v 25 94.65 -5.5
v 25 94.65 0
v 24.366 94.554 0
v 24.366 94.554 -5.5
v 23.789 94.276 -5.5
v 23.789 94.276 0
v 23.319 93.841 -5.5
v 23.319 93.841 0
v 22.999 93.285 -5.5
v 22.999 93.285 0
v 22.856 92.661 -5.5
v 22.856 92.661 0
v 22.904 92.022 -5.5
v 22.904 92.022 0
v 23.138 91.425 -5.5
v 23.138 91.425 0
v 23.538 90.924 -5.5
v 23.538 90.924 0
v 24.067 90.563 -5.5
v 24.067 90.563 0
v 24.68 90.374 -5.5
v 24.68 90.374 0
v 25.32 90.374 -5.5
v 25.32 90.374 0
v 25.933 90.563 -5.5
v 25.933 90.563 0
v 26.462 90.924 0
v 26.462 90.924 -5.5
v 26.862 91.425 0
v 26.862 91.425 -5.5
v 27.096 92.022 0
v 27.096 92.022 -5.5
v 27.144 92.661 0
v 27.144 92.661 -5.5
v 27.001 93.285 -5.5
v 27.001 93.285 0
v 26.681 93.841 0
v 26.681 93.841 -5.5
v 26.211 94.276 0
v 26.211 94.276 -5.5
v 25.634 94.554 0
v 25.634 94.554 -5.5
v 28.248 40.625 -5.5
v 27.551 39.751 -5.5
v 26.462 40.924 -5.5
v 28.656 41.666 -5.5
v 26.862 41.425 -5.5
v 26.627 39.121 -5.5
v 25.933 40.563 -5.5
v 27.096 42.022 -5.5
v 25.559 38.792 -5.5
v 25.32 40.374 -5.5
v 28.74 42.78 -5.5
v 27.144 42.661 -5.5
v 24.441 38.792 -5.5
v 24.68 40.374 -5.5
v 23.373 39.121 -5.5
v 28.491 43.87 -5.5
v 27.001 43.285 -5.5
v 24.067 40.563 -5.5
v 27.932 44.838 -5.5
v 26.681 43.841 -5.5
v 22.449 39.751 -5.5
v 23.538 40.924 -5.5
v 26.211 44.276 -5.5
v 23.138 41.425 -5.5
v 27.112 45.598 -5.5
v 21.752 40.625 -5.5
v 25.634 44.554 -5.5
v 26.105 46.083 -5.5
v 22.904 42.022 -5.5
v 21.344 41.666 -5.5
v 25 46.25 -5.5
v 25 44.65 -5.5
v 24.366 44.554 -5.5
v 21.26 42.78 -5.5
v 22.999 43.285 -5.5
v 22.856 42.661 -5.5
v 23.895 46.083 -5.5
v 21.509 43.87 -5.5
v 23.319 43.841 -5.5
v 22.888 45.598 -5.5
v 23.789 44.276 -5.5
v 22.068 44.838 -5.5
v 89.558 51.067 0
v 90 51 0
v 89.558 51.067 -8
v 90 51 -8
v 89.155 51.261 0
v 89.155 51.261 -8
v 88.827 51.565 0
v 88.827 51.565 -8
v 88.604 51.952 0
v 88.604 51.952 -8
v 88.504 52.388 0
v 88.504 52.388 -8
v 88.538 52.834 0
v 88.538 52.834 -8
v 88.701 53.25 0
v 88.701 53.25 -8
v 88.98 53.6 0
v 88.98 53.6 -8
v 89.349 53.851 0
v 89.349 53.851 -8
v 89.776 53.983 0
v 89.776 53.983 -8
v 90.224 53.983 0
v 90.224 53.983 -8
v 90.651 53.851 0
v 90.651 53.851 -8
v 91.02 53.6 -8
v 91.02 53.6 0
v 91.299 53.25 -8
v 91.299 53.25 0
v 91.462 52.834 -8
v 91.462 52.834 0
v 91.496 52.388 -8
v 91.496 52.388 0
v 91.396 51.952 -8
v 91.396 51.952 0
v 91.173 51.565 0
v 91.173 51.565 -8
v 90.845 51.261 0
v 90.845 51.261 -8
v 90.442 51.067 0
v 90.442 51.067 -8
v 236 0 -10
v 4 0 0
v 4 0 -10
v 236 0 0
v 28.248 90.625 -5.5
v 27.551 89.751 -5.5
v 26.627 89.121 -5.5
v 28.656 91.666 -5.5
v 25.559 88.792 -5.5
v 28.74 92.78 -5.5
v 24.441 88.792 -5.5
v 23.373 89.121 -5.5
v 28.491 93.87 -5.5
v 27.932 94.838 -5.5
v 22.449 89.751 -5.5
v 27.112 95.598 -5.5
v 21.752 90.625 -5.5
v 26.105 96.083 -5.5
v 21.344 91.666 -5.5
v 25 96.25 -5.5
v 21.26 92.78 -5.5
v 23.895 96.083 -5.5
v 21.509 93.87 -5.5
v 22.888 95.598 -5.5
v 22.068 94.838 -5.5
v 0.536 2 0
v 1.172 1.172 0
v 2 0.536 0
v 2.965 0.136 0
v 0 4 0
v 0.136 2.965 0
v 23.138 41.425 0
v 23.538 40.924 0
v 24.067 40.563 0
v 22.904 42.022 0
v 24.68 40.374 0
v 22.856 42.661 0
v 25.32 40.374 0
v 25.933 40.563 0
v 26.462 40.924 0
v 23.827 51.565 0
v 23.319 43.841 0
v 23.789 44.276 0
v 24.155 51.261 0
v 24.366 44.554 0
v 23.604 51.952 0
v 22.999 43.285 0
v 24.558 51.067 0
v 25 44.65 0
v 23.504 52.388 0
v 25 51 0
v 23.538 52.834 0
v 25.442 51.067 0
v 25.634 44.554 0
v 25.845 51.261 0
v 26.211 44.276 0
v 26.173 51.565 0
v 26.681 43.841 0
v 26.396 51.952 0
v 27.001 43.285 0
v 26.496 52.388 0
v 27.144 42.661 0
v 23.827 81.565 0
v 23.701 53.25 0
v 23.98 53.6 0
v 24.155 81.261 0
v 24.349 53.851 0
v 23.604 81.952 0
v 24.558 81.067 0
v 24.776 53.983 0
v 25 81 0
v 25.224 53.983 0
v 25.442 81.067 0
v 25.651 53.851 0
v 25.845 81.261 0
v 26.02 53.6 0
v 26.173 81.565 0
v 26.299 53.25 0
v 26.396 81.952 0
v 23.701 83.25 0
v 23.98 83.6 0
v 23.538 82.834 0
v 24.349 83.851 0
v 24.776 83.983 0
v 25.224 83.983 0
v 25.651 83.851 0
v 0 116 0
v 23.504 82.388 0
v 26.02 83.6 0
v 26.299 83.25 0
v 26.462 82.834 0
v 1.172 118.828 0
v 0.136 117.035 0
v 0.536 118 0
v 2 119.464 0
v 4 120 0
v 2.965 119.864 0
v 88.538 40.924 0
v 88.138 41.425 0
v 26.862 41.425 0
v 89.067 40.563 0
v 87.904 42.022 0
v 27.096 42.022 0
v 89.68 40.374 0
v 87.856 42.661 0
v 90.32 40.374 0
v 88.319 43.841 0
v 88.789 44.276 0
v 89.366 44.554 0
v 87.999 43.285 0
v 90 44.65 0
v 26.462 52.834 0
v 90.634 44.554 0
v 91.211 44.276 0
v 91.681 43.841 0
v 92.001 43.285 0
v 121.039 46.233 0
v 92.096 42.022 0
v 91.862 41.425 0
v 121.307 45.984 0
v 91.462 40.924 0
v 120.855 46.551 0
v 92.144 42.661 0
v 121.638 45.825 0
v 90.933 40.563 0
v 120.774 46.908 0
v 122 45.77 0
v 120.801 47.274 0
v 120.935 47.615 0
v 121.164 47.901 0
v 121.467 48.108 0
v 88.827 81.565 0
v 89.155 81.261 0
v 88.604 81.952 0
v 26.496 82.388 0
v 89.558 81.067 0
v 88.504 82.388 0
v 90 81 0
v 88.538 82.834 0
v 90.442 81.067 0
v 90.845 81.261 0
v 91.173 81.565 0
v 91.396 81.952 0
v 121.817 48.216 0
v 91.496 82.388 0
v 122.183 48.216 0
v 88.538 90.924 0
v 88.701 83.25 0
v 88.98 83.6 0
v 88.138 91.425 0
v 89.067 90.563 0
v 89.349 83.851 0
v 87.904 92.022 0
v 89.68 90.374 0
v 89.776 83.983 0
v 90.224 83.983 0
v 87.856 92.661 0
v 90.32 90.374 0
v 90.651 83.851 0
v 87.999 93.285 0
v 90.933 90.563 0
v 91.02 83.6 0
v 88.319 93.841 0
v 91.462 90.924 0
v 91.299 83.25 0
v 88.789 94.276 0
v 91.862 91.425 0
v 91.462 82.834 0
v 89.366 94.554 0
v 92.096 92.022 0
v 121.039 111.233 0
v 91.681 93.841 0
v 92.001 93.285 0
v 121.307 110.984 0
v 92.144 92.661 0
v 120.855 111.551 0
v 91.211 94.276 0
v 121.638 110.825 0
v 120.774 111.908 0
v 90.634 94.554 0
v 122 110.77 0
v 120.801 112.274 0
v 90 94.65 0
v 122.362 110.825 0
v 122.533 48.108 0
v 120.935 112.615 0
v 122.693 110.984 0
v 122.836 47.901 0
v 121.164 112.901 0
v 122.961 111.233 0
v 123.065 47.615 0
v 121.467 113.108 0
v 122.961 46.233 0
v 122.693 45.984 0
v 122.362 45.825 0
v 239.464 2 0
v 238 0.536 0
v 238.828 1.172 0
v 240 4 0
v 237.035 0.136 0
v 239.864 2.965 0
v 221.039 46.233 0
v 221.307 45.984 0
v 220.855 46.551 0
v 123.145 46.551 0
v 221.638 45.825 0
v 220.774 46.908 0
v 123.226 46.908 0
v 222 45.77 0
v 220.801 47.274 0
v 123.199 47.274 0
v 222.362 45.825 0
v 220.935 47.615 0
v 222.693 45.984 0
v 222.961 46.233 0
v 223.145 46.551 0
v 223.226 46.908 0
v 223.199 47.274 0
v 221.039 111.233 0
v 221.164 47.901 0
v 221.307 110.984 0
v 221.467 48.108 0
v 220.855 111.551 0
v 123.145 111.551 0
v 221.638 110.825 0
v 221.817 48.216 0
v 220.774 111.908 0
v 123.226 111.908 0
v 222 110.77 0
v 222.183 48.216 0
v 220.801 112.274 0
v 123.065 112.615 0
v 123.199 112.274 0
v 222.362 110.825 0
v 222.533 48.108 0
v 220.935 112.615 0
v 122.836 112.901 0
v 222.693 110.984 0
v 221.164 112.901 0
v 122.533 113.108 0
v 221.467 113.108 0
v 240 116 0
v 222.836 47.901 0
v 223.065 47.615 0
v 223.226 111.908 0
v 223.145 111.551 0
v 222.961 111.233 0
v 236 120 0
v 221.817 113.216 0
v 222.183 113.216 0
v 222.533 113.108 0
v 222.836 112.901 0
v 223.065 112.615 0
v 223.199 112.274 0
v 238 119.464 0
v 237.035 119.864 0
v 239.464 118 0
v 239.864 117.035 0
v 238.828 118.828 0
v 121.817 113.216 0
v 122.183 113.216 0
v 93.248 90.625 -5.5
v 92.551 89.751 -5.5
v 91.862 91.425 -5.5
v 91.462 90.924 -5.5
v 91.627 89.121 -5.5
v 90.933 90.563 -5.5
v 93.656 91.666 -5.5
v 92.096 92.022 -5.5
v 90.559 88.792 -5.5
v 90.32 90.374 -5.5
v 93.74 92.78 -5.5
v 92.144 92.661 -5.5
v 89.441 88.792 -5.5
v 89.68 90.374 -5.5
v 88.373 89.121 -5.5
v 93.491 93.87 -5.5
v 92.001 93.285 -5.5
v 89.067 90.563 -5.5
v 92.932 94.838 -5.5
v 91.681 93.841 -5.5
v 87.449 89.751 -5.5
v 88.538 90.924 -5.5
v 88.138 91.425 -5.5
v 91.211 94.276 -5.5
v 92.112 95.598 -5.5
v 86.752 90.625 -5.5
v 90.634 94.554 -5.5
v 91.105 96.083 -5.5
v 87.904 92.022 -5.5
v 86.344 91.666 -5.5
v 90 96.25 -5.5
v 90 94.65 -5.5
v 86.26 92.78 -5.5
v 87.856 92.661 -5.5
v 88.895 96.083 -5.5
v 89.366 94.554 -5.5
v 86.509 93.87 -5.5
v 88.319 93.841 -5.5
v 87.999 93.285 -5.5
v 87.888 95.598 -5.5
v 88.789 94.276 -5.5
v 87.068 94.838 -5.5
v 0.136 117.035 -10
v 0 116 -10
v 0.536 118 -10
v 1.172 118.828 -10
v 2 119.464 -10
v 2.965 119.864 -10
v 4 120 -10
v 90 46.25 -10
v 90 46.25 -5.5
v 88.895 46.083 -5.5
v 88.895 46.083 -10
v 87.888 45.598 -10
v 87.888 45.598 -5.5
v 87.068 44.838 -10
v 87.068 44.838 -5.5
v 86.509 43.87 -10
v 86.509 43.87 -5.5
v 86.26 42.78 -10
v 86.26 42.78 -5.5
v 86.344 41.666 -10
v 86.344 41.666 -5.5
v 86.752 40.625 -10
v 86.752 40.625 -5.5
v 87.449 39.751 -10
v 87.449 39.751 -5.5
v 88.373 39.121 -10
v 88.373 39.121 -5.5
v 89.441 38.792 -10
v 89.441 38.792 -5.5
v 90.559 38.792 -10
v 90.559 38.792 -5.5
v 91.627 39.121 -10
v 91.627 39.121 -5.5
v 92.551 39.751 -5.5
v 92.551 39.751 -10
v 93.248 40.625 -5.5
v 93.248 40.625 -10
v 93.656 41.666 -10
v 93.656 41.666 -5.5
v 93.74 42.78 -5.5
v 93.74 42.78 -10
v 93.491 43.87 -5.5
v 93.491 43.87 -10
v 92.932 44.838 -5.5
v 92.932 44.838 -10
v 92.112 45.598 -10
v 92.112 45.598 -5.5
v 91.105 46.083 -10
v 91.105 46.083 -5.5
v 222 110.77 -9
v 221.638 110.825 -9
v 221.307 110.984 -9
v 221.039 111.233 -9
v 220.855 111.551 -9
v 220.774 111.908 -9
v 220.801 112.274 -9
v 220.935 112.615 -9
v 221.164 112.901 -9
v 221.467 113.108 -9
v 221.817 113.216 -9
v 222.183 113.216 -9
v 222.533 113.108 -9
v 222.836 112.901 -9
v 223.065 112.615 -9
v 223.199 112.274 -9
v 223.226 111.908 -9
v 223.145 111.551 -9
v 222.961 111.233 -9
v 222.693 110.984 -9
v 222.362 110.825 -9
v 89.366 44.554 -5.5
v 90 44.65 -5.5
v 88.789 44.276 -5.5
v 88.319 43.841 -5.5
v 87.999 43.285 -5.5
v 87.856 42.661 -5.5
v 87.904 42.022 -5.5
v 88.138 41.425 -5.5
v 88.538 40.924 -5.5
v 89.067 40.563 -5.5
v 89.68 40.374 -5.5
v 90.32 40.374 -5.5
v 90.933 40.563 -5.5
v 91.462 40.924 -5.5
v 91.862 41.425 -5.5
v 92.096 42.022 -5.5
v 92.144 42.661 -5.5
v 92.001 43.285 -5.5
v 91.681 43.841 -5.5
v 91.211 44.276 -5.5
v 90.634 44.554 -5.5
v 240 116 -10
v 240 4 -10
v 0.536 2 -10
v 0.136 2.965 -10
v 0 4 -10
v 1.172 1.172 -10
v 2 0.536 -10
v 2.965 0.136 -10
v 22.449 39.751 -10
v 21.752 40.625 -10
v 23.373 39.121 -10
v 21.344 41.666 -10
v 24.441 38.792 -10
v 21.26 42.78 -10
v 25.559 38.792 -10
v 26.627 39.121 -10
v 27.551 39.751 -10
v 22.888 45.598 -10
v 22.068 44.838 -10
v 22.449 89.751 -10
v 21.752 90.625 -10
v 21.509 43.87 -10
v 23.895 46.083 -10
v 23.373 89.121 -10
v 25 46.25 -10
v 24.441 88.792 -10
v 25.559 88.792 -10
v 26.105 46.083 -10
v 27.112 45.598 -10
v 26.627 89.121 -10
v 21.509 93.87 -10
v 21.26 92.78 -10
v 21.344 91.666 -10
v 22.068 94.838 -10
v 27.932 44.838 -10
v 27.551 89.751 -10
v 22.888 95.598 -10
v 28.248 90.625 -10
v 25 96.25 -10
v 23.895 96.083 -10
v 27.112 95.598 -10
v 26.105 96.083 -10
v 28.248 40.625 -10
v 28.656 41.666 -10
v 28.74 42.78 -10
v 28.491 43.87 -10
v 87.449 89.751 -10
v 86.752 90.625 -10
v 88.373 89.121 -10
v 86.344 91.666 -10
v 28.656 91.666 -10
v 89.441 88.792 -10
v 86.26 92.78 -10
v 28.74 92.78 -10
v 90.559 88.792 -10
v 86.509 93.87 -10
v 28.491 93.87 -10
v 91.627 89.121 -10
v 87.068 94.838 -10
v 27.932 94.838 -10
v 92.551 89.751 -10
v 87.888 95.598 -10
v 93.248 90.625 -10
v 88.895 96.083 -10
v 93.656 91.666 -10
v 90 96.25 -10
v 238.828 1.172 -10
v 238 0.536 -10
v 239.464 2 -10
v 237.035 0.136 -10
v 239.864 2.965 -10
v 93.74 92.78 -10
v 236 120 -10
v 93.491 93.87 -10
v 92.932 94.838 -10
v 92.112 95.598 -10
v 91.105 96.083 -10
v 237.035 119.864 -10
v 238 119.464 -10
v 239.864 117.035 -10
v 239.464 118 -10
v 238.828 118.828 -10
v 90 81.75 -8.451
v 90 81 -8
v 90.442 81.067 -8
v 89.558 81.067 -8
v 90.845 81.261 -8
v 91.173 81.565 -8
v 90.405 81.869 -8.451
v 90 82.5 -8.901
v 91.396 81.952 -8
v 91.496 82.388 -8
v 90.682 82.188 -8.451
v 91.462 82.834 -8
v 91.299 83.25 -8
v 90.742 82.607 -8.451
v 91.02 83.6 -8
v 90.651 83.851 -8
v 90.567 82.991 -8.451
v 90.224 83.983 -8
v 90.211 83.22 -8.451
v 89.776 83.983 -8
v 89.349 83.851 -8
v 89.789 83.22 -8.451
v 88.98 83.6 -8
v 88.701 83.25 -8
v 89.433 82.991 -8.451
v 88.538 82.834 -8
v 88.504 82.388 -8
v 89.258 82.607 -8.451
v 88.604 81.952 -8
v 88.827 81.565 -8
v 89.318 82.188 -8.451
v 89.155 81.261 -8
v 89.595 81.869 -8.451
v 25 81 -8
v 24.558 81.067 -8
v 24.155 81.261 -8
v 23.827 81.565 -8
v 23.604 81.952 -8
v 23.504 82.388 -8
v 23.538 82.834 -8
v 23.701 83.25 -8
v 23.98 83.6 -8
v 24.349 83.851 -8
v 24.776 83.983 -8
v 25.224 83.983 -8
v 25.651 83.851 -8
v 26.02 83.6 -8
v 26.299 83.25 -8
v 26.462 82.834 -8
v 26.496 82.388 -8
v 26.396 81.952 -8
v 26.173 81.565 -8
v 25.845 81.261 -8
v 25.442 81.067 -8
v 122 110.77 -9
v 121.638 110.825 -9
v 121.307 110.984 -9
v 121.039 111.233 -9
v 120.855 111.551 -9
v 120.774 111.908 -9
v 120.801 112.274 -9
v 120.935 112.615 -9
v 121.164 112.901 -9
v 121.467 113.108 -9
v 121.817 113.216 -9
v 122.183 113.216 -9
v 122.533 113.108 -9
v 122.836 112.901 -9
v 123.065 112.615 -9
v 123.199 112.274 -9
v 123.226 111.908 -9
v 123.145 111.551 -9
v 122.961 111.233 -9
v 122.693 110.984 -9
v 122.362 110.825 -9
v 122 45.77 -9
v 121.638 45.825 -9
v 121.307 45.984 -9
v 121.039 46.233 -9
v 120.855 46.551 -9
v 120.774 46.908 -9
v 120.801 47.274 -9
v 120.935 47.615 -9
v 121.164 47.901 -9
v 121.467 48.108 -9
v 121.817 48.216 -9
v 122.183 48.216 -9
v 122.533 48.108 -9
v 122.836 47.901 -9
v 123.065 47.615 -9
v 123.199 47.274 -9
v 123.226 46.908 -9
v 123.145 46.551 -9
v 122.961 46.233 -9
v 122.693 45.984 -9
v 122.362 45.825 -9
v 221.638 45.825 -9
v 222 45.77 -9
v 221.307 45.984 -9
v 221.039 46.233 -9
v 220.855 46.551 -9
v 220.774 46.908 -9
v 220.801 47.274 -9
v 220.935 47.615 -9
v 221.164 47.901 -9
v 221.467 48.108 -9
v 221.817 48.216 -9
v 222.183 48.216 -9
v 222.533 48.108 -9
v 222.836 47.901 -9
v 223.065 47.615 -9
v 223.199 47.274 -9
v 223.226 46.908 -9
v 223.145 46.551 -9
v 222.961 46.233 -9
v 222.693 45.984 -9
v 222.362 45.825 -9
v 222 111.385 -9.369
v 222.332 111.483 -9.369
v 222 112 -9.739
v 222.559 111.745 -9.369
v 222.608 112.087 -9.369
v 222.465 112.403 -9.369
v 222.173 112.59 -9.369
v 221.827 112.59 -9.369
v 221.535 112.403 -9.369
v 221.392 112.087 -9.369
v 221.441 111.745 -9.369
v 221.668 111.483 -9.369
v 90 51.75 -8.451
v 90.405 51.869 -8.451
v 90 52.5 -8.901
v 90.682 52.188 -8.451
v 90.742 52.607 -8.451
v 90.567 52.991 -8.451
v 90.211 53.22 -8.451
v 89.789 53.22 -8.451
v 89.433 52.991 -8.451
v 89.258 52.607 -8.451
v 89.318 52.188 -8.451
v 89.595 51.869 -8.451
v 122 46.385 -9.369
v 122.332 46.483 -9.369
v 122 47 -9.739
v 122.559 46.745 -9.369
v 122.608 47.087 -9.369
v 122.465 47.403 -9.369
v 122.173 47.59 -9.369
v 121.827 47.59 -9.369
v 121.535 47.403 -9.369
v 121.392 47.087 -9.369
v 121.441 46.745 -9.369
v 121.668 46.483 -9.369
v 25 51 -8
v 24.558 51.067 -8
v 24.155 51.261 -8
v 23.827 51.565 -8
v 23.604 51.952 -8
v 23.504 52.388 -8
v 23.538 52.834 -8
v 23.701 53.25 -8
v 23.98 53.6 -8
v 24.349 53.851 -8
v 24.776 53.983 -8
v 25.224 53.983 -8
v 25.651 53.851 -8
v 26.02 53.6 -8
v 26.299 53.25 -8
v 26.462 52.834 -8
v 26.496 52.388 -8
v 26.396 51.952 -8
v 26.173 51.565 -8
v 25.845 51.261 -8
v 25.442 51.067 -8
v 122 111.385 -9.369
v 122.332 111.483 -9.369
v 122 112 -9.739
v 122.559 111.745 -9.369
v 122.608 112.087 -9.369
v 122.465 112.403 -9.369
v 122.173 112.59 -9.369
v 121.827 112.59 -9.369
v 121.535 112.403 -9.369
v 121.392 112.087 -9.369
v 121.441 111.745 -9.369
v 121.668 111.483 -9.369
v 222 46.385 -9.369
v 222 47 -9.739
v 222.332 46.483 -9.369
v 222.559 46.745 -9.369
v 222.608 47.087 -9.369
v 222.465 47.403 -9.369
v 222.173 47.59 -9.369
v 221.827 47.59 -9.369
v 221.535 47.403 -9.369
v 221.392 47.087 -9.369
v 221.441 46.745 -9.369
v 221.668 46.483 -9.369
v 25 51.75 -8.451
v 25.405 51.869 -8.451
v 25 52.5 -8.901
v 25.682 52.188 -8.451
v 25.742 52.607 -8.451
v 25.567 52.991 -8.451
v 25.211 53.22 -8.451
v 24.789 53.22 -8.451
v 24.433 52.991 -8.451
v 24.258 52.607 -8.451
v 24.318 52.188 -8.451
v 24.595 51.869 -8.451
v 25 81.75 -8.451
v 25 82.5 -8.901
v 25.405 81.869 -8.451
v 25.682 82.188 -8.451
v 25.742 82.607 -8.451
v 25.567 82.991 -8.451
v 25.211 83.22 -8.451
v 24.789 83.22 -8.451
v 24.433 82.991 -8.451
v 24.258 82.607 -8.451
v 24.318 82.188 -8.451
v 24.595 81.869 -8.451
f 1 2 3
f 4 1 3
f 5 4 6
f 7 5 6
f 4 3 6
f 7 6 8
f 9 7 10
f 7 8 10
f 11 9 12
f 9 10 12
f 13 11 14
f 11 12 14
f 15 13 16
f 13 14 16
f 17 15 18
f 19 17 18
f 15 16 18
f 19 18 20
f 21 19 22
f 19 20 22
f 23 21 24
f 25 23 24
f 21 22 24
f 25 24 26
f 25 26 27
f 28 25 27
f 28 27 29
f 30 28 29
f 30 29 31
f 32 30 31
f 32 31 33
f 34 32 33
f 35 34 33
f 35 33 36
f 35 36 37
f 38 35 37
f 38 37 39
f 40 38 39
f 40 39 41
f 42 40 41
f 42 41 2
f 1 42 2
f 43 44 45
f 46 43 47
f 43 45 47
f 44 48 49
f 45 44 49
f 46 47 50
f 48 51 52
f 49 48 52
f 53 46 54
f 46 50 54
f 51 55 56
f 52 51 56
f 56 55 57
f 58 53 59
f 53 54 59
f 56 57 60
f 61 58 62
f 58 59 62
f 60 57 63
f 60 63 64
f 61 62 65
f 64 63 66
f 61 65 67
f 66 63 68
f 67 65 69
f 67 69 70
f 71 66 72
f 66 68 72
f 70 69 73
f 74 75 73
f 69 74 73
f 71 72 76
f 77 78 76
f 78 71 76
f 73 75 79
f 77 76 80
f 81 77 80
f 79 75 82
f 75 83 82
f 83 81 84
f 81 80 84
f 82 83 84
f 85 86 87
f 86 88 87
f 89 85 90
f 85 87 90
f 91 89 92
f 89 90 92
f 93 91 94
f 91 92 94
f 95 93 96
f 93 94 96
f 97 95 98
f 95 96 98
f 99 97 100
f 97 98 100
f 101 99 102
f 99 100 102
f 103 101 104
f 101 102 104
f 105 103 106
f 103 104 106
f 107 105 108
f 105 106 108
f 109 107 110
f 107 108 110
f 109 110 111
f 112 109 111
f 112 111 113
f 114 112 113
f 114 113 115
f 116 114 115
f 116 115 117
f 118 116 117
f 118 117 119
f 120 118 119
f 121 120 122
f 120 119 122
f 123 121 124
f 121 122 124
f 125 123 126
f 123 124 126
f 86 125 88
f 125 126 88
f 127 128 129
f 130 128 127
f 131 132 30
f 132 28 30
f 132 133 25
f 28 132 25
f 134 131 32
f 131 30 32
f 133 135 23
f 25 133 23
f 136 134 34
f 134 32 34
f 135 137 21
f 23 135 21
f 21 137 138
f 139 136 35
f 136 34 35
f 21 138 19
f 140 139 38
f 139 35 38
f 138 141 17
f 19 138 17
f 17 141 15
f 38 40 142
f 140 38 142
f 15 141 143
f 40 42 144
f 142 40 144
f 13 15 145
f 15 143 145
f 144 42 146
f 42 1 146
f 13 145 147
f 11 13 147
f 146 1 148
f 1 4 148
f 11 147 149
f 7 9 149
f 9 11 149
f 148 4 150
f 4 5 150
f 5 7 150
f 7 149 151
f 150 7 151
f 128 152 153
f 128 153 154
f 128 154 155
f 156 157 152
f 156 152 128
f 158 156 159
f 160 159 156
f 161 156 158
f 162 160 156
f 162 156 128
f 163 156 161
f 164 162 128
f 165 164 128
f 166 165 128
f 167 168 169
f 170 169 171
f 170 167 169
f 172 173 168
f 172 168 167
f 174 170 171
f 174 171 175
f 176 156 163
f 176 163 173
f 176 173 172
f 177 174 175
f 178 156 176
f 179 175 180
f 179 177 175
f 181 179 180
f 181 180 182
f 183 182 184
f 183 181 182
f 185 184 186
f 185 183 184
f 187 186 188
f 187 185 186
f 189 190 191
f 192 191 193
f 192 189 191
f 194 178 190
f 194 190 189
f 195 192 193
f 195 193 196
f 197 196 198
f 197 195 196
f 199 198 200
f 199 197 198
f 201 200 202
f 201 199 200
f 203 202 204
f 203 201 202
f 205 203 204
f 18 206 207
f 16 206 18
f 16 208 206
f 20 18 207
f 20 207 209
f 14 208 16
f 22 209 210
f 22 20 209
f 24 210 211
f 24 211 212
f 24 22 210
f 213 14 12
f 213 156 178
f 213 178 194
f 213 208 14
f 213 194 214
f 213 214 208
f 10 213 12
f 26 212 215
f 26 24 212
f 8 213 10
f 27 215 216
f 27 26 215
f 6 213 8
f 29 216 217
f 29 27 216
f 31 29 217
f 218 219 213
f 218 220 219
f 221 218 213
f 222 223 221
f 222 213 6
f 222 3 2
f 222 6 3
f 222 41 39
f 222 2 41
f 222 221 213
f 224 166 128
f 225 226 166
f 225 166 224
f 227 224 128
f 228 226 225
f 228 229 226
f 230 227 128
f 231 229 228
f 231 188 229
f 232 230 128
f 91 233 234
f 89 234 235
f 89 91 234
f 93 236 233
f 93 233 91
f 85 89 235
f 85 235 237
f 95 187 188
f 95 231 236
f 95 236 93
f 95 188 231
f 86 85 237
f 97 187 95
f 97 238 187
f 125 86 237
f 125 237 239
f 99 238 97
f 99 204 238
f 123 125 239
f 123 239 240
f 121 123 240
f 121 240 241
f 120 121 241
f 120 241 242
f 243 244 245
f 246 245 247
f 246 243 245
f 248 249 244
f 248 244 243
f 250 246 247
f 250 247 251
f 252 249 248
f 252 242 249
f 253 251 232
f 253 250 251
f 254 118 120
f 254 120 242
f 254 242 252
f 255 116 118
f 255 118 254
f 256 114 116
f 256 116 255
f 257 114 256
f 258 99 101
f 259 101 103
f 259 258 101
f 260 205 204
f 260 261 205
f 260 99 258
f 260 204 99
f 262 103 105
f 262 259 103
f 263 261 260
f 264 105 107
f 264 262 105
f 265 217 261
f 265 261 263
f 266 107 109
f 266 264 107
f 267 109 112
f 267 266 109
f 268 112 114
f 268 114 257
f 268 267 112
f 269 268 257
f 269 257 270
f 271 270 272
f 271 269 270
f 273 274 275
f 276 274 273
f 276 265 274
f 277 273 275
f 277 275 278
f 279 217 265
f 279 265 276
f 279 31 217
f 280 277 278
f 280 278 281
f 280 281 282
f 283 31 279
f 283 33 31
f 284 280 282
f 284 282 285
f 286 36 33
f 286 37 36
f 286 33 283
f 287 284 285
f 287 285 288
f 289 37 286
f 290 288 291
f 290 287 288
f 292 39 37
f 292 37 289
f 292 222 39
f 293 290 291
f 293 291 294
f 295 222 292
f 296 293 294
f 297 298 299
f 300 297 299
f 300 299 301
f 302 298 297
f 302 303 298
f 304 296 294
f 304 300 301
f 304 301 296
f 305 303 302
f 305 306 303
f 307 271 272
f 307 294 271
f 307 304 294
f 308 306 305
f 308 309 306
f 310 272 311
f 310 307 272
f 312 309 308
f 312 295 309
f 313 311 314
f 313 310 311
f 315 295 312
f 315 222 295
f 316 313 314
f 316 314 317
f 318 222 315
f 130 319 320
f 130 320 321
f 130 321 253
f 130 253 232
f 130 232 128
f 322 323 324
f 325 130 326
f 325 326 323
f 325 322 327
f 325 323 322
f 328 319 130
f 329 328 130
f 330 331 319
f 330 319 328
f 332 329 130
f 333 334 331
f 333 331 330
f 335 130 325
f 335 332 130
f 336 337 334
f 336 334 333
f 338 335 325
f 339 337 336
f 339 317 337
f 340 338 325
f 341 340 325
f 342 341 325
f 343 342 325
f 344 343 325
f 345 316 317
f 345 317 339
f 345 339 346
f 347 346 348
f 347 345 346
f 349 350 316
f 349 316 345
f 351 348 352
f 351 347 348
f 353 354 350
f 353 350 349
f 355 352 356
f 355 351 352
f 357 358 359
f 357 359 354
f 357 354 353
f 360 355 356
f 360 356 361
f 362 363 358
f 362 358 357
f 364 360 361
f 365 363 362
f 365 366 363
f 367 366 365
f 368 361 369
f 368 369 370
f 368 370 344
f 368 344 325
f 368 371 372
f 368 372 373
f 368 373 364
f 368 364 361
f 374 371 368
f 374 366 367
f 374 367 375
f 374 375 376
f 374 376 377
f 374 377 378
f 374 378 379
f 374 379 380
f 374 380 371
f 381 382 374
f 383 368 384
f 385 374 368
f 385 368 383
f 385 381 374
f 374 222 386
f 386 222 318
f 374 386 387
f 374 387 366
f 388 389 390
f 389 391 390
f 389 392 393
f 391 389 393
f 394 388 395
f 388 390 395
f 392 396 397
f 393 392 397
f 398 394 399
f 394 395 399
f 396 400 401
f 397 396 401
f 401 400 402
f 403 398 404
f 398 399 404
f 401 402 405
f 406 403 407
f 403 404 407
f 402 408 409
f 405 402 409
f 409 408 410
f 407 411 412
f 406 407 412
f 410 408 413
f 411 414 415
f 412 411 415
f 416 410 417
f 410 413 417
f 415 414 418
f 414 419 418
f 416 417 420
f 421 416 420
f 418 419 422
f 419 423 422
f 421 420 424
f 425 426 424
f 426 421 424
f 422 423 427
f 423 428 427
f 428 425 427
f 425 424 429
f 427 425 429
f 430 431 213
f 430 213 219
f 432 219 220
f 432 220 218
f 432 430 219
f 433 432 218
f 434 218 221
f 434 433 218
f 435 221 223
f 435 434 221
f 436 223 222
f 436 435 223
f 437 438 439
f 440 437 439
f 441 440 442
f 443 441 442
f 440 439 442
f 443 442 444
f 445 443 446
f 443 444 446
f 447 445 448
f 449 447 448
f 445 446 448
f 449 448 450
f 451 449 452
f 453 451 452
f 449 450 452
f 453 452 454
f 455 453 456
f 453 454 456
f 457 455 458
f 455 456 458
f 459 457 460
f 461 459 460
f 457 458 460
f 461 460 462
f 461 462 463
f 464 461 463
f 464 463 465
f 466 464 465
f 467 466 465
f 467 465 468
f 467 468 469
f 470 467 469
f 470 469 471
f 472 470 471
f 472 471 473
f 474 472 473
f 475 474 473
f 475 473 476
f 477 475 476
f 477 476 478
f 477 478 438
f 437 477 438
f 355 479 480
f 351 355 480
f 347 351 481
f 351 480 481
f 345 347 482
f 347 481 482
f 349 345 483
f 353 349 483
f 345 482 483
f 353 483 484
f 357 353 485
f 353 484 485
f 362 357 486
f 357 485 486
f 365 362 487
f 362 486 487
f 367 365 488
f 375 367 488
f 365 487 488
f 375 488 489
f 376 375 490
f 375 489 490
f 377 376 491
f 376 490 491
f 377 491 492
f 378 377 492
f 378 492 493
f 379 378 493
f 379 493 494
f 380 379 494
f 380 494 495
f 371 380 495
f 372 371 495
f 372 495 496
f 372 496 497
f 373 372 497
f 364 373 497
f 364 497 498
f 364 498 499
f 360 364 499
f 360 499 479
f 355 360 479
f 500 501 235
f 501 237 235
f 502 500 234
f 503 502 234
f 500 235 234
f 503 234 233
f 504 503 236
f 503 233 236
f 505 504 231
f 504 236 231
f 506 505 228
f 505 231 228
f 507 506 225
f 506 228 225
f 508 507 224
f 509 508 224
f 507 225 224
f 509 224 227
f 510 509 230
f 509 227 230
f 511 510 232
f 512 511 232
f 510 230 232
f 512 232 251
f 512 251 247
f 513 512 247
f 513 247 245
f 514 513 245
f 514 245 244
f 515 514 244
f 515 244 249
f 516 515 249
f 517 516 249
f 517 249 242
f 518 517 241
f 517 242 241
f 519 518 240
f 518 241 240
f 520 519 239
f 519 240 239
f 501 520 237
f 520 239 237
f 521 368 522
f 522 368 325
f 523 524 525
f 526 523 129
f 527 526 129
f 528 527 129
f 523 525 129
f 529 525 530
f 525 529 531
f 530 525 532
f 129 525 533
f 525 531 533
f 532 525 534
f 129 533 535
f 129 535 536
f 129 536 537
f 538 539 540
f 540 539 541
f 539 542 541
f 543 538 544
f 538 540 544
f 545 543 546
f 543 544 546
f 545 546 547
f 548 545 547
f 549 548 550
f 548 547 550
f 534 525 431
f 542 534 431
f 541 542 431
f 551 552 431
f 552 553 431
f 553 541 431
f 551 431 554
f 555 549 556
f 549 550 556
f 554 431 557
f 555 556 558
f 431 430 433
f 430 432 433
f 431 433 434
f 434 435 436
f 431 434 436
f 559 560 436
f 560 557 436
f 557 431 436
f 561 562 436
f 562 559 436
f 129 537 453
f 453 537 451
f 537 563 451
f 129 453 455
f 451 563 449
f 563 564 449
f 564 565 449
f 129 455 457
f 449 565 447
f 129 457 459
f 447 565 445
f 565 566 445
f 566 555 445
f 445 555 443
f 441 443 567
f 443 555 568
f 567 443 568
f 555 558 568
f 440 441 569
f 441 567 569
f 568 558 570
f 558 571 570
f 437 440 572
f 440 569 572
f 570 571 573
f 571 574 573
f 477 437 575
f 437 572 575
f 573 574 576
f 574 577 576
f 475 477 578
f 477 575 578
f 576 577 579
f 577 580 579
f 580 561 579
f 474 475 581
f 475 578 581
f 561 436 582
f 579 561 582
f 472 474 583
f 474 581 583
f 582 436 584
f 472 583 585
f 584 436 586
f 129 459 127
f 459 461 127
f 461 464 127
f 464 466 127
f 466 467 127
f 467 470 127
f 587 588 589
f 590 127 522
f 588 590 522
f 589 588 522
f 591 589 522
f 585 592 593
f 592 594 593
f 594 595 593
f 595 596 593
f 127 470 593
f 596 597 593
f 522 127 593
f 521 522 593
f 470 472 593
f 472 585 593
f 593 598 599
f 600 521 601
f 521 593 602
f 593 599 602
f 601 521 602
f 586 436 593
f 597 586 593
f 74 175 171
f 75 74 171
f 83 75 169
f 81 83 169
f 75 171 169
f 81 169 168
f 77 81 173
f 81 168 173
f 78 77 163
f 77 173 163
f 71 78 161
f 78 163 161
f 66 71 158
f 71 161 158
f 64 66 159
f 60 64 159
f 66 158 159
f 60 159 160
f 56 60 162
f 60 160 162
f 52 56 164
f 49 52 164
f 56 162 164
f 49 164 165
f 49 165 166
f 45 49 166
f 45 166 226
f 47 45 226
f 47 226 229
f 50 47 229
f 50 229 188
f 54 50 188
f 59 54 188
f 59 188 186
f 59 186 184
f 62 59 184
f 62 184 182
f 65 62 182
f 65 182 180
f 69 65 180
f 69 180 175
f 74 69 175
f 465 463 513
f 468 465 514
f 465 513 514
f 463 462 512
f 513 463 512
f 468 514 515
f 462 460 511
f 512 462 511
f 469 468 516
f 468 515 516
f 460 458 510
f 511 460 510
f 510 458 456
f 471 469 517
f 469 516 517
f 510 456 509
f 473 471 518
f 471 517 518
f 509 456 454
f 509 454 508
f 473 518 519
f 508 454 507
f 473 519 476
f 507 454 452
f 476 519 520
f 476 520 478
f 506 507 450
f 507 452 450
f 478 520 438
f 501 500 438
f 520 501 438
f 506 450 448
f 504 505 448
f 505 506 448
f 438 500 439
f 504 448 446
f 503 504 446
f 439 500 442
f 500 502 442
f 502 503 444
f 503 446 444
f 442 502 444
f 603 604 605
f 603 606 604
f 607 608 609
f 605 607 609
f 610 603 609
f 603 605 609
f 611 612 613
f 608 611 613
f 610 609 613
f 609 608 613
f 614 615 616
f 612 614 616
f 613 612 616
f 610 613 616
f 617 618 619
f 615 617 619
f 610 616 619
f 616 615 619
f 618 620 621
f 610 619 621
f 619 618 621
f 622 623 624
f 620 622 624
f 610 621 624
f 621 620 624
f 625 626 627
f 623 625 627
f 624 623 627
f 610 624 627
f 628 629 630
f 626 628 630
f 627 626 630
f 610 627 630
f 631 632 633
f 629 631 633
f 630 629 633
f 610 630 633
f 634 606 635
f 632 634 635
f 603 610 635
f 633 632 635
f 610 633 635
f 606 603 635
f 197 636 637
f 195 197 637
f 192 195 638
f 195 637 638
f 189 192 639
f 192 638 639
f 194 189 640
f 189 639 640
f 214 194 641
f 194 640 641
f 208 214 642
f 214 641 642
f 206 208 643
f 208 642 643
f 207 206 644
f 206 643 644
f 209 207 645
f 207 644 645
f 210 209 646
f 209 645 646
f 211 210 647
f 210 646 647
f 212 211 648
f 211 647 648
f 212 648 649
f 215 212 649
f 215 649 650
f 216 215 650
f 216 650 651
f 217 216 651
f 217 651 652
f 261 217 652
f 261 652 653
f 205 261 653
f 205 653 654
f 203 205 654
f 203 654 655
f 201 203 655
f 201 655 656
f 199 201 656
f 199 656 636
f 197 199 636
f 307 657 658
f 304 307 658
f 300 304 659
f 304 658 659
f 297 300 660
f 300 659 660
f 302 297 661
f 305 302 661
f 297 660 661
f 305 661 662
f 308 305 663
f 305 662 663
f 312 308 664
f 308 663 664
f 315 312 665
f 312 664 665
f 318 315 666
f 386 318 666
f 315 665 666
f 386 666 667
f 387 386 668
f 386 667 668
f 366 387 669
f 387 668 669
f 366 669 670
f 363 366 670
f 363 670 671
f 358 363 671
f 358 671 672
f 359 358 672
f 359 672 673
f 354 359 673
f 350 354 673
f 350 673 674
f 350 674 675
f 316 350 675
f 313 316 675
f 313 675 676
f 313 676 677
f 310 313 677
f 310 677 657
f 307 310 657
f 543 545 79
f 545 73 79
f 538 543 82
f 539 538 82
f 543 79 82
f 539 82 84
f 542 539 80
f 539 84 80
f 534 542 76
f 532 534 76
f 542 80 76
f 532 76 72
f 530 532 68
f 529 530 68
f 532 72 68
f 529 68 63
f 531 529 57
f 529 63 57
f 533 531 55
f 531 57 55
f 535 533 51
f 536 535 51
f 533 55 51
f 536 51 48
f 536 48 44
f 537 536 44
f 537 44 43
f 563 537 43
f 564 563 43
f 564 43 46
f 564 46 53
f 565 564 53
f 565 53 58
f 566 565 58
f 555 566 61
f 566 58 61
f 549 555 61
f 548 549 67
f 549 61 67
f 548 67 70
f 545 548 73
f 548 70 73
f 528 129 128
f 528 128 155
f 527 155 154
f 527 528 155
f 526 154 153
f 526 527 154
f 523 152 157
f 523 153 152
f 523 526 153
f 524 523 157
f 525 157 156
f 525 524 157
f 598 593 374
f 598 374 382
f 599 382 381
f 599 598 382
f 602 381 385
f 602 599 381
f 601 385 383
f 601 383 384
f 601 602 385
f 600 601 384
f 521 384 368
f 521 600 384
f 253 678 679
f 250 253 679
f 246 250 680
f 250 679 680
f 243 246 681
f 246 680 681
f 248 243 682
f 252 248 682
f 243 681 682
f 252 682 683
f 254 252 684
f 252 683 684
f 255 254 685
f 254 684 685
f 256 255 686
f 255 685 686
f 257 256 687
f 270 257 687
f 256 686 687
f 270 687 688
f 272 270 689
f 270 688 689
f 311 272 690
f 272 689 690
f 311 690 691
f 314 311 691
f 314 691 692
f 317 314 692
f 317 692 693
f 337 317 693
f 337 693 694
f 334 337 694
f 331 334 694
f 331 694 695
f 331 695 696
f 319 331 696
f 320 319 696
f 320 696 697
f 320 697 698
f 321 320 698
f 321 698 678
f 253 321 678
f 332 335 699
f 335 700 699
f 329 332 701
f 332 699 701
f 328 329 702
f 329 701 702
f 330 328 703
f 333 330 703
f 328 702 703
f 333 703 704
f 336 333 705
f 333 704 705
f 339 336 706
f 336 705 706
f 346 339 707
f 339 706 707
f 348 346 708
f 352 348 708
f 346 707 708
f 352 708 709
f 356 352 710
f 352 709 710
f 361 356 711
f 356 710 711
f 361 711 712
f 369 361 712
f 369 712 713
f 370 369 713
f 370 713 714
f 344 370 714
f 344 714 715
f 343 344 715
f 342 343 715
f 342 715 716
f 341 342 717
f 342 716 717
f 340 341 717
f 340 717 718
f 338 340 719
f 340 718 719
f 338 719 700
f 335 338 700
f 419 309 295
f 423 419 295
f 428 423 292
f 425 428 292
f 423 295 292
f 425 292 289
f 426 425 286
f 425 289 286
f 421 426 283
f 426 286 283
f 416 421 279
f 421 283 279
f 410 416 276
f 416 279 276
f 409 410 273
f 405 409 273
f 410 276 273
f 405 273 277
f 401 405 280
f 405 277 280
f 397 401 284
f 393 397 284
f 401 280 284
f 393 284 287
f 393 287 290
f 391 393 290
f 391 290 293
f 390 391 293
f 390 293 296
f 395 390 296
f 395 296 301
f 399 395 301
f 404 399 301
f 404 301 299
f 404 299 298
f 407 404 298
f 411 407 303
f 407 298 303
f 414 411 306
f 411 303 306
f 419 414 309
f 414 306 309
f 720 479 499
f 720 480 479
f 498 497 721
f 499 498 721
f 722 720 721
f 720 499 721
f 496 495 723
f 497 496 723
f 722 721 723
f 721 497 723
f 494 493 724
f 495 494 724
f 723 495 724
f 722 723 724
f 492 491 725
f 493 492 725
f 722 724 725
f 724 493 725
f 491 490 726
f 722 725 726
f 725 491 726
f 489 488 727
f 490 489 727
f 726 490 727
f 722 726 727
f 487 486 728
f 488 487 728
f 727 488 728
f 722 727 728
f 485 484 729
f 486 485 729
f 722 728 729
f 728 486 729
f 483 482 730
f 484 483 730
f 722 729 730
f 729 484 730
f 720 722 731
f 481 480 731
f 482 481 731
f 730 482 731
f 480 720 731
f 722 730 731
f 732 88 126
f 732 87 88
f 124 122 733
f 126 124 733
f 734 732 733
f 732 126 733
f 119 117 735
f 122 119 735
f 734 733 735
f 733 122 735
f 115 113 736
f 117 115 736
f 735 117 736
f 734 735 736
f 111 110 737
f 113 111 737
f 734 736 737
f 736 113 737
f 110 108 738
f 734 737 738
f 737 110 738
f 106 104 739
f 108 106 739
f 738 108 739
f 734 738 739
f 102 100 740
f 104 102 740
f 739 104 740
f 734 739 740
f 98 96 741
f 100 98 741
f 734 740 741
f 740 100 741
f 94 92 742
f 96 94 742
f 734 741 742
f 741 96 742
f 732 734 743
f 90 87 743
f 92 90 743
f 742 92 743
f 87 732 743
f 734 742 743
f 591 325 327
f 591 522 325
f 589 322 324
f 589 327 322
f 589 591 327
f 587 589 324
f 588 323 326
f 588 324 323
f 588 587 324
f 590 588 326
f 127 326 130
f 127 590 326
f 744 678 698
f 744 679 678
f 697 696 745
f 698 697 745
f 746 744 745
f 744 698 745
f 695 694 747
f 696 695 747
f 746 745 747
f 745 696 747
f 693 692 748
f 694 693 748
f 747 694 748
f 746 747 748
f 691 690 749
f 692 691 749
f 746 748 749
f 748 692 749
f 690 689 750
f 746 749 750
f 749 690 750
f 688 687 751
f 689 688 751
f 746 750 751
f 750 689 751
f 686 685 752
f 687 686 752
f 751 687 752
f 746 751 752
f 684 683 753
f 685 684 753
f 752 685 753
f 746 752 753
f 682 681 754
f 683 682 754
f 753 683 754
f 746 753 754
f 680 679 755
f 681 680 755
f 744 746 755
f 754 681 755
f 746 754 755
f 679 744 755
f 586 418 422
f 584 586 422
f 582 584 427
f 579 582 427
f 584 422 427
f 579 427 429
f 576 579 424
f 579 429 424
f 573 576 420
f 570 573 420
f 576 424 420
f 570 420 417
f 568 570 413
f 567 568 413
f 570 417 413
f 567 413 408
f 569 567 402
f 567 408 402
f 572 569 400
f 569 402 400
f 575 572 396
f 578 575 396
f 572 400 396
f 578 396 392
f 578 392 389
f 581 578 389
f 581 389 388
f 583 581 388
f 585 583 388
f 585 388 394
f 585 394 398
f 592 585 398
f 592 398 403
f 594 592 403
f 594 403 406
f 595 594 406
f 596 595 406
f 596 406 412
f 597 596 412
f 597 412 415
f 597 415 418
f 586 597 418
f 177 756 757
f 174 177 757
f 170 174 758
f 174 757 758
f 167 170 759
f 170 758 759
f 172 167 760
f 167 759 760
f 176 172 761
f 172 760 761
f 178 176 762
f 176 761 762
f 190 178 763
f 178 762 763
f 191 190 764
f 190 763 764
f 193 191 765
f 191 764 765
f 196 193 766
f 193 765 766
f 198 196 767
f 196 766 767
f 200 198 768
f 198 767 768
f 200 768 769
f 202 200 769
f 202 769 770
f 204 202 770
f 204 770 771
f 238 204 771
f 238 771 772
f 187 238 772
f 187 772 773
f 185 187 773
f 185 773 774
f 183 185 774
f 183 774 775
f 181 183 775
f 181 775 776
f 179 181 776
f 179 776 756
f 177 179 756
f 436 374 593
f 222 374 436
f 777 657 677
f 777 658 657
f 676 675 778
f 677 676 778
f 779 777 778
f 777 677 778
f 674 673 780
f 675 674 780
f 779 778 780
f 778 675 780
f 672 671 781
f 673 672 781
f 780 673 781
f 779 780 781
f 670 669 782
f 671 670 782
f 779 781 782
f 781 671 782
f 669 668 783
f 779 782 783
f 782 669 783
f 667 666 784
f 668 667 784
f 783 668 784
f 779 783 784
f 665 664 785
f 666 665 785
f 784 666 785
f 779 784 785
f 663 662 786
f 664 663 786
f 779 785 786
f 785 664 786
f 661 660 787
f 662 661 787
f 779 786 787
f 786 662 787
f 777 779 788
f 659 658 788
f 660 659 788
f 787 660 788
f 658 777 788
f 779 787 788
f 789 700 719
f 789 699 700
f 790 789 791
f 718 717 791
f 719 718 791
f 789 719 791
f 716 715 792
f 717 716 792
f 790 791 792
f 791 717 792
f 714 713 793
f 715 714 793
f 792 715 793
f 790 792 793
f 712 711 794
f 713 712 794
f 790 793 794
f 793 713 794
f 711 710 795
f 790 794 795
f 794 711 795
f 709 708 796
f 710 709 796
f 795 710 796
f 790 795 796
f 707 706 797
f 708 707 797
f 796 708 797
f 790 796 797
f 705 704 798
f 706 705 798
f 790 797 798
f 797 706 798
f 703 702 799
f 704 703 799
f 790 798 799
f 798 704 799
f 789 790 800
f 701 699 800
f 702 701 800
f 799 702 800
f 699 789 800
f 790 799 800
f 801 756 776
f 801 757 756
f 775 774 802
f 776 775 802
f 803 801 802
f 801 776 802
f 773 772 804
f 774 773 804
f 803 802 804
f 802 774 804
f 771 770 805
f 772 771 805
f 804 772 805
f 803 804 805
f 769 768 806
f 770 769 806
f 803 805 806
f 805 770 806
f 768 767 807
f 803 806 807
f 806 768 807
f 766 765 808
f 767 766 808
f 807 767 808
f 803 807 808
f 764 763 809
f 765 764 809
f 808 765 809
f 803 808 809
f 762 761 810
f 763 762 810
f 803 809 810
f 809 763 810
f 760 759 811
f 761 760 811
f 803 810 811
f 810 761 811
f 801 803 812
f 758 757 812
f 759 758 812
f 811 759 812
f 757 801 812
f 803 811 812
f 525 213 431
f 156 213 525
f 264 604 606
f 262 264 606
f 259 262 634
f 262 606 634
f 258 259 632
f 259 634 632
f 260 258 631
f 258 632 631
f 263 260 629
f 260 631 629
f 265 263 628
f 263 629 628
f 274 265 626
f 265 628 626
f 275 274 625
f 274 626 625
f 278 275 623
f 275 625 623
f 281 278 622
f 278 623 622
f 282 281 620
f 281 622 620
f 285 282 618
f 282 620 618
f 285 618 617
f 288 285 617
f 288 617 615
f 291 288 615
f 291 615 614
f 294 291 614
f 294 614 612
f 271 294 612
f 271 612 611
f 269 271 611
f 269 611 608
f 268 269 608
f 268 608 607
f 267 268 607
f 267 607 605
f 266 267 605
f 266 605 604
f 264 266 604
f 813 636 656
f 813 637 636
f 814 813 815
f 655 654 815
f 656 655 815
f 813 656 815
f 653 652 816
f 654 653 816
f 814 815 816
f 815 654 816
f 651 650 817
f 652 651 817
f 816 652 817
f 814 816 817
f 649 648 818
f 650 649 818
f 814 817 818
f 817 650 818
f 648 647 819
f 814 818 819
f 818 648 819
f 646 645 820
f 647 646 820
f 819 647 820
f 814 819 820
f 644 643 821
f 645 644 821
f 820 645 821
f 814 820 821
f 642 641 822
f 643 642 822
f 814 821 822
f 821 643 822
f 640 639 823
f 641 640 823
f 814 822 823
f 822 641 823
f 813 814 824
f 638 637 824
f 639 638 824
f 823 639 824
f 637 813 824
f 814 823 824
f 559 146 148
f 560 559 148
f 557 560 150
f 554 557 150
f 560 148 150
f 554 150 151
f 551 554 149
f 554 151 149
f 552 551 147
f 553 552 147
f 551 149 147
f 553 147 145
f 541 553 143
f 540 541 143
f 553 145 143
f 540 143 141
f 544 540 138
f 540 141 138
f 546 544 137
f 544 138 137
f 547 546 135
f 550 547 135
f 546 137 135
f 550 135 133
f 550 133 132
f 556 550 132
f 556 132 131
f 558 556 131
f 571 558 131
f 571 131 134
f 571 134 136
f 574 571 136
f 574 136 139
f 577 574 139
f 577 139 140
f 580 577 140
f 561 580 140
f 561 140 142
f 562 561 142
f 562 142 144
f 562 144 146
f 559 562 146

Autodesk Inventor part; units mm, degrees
ref_plane "YZ Plane" through (0, 0, 0) normal (1, 0, 0) x (0, 1, 0)
ref_plane "XZ Plane" through (0, 0, 0) normal (0, 1, 0) x (-1, 0, 0)
ref_plane "XY Plane" through (0, 0, 0) normal (0, 0, 1) x (1, 0, 0)
sketch "Skizze1" plane through (0, 0, 0) normal (0, 0, 1) x (1, 0, 0)
  line L0 (0, 0) -> (95, 0)
  line L1 (95, 0) -> (95, 120)
  line L2 (95, 120) -> (0, 120)
  line L3 (0, 120) -> (0, 0)
  circle A0 centre (38.1, 37.9782) radius 2.905
  circle A1 centre (90, 42.5) radius 1.5
  circle A2 centre (24.7598, 24.638) radius 2.905
  circle A3 centre (38.1, 11.2978) radius 2.905
  circle A4 centre (51.4402, 24.638) radius 2.905
  circle A5 centre (90, 92.5) radius 1.5
  circle A6 centre (25, 42.5) radius 1.5
  circle A7 centre (25, 92.5) radius 1.5
  line L4 (0, 120) -> (240, 120)
  line L5 (240, 120) -> (240, 0)
  line L6 (240, 0) -> (0, 0)
  line L7 (0, 0) -> (0, 120)
  circle A8 centre (222, 112) radius 1.5
  circle A9 centre (122, 112) radius 1.5
  circle A10 centre (222, 47) radius 1.5
  circle A11 centre (122, 47) radius 1.5
  point P0 (38.1, 24.638)
  dimension "d0" = 120
  dimension "d1" = 95
  dimension "d5" = 5
  dimension "d6" = 3
  dimension "d12" = 360
  dimension "d16" = 50
  dimension "d19" = 65
  dimension "d69" = 42.5
  dimension "d99" = 240
  dimension "d100" = 120
  dimension "d103" = 8
  dimension "d104" = 18
  dimension "d105" = 3
  dimension "d108" = 100
  dimension "d111" = 65
  dimension "d114" = 47
extrude "Extrusion2" add sketch "Skizze1" against normal blind 10 contours L3 L2 L1 L0 | L1 L4 L5 L6 | A0 | A2 | A3 | A4 | A8 | A9 | A10 | A11
hole "Bohrung8" at (122, 112, 0) at (222, 112, 0) at (222, 47, 0) at (122, 47, 0) direction (0, 0, -1) diameter 2.459 depth 9 tip angle 118 thread size "M3x0.5" class "6H" standard "ISO Metric profile"
sketch "Skizze11" plane through (0, 0, -10) normal (0, 0, -1) x (-1, 0, 0)
  circle A0 centre (-25, 92.5) radius 1.5 projected
  circle A1 centre (-25, 42.5) radius 1.5 projected
  circle A2 centre (-90, 92.5) radius 1.5 projected
  circle A3 centre (-90, 42.5) radius 1.5 projected
hole "Bohrung11" at (25, 42.5, -10) at (90, 42.5, -10) at (90, 92.5, -10) at (25, 92.5, -10) direction (0, 0, 1) diameter 4.3 depth 13 tip angle 118 counterbore diameter 7.5 counterbore depth 4.5
sketch "Skizze12" plane through (0, 0, 0) normal (0, 0, 1) x (1, 0, 0)
  circle A0 centre (25, 92.5) radius 2.15 projected
  circle A1 centre (25, 42.5) radius 2.15 projected
  line L0 (240, 120) -> (0, 120) projected
  line L1 (25, 92.5) -> (25, 42.5)
  circle A2 centre (25, 82.5) radius 1.5
  circle A3 centre (25, 52.5) radius 1.5
  circle A4 centre (90, 82.5) radius 1.5
  circle A5 centre (90, 52.5) radius 1.5
  dimension "d163" = 3
  dimension "d164" = 10
  dimension "d167" = 30
  dimension "d170" = 65
hole "Bohrung12" at (25, 82.5, 0) at (25, 52.5, 0) at (90, 52.5, 0) at (90, 82.5, 0) direction (0, 0, -1) diameter 3 depth 8 tip angle 118
fillet "Rundung1" radius 4 4 edges at (240, 0, -5) (0, 0, -5) (0, 120, -5) (240, 120, -5)
equation "\"d100\" = d0"
properties part number "Paddle_Base"
